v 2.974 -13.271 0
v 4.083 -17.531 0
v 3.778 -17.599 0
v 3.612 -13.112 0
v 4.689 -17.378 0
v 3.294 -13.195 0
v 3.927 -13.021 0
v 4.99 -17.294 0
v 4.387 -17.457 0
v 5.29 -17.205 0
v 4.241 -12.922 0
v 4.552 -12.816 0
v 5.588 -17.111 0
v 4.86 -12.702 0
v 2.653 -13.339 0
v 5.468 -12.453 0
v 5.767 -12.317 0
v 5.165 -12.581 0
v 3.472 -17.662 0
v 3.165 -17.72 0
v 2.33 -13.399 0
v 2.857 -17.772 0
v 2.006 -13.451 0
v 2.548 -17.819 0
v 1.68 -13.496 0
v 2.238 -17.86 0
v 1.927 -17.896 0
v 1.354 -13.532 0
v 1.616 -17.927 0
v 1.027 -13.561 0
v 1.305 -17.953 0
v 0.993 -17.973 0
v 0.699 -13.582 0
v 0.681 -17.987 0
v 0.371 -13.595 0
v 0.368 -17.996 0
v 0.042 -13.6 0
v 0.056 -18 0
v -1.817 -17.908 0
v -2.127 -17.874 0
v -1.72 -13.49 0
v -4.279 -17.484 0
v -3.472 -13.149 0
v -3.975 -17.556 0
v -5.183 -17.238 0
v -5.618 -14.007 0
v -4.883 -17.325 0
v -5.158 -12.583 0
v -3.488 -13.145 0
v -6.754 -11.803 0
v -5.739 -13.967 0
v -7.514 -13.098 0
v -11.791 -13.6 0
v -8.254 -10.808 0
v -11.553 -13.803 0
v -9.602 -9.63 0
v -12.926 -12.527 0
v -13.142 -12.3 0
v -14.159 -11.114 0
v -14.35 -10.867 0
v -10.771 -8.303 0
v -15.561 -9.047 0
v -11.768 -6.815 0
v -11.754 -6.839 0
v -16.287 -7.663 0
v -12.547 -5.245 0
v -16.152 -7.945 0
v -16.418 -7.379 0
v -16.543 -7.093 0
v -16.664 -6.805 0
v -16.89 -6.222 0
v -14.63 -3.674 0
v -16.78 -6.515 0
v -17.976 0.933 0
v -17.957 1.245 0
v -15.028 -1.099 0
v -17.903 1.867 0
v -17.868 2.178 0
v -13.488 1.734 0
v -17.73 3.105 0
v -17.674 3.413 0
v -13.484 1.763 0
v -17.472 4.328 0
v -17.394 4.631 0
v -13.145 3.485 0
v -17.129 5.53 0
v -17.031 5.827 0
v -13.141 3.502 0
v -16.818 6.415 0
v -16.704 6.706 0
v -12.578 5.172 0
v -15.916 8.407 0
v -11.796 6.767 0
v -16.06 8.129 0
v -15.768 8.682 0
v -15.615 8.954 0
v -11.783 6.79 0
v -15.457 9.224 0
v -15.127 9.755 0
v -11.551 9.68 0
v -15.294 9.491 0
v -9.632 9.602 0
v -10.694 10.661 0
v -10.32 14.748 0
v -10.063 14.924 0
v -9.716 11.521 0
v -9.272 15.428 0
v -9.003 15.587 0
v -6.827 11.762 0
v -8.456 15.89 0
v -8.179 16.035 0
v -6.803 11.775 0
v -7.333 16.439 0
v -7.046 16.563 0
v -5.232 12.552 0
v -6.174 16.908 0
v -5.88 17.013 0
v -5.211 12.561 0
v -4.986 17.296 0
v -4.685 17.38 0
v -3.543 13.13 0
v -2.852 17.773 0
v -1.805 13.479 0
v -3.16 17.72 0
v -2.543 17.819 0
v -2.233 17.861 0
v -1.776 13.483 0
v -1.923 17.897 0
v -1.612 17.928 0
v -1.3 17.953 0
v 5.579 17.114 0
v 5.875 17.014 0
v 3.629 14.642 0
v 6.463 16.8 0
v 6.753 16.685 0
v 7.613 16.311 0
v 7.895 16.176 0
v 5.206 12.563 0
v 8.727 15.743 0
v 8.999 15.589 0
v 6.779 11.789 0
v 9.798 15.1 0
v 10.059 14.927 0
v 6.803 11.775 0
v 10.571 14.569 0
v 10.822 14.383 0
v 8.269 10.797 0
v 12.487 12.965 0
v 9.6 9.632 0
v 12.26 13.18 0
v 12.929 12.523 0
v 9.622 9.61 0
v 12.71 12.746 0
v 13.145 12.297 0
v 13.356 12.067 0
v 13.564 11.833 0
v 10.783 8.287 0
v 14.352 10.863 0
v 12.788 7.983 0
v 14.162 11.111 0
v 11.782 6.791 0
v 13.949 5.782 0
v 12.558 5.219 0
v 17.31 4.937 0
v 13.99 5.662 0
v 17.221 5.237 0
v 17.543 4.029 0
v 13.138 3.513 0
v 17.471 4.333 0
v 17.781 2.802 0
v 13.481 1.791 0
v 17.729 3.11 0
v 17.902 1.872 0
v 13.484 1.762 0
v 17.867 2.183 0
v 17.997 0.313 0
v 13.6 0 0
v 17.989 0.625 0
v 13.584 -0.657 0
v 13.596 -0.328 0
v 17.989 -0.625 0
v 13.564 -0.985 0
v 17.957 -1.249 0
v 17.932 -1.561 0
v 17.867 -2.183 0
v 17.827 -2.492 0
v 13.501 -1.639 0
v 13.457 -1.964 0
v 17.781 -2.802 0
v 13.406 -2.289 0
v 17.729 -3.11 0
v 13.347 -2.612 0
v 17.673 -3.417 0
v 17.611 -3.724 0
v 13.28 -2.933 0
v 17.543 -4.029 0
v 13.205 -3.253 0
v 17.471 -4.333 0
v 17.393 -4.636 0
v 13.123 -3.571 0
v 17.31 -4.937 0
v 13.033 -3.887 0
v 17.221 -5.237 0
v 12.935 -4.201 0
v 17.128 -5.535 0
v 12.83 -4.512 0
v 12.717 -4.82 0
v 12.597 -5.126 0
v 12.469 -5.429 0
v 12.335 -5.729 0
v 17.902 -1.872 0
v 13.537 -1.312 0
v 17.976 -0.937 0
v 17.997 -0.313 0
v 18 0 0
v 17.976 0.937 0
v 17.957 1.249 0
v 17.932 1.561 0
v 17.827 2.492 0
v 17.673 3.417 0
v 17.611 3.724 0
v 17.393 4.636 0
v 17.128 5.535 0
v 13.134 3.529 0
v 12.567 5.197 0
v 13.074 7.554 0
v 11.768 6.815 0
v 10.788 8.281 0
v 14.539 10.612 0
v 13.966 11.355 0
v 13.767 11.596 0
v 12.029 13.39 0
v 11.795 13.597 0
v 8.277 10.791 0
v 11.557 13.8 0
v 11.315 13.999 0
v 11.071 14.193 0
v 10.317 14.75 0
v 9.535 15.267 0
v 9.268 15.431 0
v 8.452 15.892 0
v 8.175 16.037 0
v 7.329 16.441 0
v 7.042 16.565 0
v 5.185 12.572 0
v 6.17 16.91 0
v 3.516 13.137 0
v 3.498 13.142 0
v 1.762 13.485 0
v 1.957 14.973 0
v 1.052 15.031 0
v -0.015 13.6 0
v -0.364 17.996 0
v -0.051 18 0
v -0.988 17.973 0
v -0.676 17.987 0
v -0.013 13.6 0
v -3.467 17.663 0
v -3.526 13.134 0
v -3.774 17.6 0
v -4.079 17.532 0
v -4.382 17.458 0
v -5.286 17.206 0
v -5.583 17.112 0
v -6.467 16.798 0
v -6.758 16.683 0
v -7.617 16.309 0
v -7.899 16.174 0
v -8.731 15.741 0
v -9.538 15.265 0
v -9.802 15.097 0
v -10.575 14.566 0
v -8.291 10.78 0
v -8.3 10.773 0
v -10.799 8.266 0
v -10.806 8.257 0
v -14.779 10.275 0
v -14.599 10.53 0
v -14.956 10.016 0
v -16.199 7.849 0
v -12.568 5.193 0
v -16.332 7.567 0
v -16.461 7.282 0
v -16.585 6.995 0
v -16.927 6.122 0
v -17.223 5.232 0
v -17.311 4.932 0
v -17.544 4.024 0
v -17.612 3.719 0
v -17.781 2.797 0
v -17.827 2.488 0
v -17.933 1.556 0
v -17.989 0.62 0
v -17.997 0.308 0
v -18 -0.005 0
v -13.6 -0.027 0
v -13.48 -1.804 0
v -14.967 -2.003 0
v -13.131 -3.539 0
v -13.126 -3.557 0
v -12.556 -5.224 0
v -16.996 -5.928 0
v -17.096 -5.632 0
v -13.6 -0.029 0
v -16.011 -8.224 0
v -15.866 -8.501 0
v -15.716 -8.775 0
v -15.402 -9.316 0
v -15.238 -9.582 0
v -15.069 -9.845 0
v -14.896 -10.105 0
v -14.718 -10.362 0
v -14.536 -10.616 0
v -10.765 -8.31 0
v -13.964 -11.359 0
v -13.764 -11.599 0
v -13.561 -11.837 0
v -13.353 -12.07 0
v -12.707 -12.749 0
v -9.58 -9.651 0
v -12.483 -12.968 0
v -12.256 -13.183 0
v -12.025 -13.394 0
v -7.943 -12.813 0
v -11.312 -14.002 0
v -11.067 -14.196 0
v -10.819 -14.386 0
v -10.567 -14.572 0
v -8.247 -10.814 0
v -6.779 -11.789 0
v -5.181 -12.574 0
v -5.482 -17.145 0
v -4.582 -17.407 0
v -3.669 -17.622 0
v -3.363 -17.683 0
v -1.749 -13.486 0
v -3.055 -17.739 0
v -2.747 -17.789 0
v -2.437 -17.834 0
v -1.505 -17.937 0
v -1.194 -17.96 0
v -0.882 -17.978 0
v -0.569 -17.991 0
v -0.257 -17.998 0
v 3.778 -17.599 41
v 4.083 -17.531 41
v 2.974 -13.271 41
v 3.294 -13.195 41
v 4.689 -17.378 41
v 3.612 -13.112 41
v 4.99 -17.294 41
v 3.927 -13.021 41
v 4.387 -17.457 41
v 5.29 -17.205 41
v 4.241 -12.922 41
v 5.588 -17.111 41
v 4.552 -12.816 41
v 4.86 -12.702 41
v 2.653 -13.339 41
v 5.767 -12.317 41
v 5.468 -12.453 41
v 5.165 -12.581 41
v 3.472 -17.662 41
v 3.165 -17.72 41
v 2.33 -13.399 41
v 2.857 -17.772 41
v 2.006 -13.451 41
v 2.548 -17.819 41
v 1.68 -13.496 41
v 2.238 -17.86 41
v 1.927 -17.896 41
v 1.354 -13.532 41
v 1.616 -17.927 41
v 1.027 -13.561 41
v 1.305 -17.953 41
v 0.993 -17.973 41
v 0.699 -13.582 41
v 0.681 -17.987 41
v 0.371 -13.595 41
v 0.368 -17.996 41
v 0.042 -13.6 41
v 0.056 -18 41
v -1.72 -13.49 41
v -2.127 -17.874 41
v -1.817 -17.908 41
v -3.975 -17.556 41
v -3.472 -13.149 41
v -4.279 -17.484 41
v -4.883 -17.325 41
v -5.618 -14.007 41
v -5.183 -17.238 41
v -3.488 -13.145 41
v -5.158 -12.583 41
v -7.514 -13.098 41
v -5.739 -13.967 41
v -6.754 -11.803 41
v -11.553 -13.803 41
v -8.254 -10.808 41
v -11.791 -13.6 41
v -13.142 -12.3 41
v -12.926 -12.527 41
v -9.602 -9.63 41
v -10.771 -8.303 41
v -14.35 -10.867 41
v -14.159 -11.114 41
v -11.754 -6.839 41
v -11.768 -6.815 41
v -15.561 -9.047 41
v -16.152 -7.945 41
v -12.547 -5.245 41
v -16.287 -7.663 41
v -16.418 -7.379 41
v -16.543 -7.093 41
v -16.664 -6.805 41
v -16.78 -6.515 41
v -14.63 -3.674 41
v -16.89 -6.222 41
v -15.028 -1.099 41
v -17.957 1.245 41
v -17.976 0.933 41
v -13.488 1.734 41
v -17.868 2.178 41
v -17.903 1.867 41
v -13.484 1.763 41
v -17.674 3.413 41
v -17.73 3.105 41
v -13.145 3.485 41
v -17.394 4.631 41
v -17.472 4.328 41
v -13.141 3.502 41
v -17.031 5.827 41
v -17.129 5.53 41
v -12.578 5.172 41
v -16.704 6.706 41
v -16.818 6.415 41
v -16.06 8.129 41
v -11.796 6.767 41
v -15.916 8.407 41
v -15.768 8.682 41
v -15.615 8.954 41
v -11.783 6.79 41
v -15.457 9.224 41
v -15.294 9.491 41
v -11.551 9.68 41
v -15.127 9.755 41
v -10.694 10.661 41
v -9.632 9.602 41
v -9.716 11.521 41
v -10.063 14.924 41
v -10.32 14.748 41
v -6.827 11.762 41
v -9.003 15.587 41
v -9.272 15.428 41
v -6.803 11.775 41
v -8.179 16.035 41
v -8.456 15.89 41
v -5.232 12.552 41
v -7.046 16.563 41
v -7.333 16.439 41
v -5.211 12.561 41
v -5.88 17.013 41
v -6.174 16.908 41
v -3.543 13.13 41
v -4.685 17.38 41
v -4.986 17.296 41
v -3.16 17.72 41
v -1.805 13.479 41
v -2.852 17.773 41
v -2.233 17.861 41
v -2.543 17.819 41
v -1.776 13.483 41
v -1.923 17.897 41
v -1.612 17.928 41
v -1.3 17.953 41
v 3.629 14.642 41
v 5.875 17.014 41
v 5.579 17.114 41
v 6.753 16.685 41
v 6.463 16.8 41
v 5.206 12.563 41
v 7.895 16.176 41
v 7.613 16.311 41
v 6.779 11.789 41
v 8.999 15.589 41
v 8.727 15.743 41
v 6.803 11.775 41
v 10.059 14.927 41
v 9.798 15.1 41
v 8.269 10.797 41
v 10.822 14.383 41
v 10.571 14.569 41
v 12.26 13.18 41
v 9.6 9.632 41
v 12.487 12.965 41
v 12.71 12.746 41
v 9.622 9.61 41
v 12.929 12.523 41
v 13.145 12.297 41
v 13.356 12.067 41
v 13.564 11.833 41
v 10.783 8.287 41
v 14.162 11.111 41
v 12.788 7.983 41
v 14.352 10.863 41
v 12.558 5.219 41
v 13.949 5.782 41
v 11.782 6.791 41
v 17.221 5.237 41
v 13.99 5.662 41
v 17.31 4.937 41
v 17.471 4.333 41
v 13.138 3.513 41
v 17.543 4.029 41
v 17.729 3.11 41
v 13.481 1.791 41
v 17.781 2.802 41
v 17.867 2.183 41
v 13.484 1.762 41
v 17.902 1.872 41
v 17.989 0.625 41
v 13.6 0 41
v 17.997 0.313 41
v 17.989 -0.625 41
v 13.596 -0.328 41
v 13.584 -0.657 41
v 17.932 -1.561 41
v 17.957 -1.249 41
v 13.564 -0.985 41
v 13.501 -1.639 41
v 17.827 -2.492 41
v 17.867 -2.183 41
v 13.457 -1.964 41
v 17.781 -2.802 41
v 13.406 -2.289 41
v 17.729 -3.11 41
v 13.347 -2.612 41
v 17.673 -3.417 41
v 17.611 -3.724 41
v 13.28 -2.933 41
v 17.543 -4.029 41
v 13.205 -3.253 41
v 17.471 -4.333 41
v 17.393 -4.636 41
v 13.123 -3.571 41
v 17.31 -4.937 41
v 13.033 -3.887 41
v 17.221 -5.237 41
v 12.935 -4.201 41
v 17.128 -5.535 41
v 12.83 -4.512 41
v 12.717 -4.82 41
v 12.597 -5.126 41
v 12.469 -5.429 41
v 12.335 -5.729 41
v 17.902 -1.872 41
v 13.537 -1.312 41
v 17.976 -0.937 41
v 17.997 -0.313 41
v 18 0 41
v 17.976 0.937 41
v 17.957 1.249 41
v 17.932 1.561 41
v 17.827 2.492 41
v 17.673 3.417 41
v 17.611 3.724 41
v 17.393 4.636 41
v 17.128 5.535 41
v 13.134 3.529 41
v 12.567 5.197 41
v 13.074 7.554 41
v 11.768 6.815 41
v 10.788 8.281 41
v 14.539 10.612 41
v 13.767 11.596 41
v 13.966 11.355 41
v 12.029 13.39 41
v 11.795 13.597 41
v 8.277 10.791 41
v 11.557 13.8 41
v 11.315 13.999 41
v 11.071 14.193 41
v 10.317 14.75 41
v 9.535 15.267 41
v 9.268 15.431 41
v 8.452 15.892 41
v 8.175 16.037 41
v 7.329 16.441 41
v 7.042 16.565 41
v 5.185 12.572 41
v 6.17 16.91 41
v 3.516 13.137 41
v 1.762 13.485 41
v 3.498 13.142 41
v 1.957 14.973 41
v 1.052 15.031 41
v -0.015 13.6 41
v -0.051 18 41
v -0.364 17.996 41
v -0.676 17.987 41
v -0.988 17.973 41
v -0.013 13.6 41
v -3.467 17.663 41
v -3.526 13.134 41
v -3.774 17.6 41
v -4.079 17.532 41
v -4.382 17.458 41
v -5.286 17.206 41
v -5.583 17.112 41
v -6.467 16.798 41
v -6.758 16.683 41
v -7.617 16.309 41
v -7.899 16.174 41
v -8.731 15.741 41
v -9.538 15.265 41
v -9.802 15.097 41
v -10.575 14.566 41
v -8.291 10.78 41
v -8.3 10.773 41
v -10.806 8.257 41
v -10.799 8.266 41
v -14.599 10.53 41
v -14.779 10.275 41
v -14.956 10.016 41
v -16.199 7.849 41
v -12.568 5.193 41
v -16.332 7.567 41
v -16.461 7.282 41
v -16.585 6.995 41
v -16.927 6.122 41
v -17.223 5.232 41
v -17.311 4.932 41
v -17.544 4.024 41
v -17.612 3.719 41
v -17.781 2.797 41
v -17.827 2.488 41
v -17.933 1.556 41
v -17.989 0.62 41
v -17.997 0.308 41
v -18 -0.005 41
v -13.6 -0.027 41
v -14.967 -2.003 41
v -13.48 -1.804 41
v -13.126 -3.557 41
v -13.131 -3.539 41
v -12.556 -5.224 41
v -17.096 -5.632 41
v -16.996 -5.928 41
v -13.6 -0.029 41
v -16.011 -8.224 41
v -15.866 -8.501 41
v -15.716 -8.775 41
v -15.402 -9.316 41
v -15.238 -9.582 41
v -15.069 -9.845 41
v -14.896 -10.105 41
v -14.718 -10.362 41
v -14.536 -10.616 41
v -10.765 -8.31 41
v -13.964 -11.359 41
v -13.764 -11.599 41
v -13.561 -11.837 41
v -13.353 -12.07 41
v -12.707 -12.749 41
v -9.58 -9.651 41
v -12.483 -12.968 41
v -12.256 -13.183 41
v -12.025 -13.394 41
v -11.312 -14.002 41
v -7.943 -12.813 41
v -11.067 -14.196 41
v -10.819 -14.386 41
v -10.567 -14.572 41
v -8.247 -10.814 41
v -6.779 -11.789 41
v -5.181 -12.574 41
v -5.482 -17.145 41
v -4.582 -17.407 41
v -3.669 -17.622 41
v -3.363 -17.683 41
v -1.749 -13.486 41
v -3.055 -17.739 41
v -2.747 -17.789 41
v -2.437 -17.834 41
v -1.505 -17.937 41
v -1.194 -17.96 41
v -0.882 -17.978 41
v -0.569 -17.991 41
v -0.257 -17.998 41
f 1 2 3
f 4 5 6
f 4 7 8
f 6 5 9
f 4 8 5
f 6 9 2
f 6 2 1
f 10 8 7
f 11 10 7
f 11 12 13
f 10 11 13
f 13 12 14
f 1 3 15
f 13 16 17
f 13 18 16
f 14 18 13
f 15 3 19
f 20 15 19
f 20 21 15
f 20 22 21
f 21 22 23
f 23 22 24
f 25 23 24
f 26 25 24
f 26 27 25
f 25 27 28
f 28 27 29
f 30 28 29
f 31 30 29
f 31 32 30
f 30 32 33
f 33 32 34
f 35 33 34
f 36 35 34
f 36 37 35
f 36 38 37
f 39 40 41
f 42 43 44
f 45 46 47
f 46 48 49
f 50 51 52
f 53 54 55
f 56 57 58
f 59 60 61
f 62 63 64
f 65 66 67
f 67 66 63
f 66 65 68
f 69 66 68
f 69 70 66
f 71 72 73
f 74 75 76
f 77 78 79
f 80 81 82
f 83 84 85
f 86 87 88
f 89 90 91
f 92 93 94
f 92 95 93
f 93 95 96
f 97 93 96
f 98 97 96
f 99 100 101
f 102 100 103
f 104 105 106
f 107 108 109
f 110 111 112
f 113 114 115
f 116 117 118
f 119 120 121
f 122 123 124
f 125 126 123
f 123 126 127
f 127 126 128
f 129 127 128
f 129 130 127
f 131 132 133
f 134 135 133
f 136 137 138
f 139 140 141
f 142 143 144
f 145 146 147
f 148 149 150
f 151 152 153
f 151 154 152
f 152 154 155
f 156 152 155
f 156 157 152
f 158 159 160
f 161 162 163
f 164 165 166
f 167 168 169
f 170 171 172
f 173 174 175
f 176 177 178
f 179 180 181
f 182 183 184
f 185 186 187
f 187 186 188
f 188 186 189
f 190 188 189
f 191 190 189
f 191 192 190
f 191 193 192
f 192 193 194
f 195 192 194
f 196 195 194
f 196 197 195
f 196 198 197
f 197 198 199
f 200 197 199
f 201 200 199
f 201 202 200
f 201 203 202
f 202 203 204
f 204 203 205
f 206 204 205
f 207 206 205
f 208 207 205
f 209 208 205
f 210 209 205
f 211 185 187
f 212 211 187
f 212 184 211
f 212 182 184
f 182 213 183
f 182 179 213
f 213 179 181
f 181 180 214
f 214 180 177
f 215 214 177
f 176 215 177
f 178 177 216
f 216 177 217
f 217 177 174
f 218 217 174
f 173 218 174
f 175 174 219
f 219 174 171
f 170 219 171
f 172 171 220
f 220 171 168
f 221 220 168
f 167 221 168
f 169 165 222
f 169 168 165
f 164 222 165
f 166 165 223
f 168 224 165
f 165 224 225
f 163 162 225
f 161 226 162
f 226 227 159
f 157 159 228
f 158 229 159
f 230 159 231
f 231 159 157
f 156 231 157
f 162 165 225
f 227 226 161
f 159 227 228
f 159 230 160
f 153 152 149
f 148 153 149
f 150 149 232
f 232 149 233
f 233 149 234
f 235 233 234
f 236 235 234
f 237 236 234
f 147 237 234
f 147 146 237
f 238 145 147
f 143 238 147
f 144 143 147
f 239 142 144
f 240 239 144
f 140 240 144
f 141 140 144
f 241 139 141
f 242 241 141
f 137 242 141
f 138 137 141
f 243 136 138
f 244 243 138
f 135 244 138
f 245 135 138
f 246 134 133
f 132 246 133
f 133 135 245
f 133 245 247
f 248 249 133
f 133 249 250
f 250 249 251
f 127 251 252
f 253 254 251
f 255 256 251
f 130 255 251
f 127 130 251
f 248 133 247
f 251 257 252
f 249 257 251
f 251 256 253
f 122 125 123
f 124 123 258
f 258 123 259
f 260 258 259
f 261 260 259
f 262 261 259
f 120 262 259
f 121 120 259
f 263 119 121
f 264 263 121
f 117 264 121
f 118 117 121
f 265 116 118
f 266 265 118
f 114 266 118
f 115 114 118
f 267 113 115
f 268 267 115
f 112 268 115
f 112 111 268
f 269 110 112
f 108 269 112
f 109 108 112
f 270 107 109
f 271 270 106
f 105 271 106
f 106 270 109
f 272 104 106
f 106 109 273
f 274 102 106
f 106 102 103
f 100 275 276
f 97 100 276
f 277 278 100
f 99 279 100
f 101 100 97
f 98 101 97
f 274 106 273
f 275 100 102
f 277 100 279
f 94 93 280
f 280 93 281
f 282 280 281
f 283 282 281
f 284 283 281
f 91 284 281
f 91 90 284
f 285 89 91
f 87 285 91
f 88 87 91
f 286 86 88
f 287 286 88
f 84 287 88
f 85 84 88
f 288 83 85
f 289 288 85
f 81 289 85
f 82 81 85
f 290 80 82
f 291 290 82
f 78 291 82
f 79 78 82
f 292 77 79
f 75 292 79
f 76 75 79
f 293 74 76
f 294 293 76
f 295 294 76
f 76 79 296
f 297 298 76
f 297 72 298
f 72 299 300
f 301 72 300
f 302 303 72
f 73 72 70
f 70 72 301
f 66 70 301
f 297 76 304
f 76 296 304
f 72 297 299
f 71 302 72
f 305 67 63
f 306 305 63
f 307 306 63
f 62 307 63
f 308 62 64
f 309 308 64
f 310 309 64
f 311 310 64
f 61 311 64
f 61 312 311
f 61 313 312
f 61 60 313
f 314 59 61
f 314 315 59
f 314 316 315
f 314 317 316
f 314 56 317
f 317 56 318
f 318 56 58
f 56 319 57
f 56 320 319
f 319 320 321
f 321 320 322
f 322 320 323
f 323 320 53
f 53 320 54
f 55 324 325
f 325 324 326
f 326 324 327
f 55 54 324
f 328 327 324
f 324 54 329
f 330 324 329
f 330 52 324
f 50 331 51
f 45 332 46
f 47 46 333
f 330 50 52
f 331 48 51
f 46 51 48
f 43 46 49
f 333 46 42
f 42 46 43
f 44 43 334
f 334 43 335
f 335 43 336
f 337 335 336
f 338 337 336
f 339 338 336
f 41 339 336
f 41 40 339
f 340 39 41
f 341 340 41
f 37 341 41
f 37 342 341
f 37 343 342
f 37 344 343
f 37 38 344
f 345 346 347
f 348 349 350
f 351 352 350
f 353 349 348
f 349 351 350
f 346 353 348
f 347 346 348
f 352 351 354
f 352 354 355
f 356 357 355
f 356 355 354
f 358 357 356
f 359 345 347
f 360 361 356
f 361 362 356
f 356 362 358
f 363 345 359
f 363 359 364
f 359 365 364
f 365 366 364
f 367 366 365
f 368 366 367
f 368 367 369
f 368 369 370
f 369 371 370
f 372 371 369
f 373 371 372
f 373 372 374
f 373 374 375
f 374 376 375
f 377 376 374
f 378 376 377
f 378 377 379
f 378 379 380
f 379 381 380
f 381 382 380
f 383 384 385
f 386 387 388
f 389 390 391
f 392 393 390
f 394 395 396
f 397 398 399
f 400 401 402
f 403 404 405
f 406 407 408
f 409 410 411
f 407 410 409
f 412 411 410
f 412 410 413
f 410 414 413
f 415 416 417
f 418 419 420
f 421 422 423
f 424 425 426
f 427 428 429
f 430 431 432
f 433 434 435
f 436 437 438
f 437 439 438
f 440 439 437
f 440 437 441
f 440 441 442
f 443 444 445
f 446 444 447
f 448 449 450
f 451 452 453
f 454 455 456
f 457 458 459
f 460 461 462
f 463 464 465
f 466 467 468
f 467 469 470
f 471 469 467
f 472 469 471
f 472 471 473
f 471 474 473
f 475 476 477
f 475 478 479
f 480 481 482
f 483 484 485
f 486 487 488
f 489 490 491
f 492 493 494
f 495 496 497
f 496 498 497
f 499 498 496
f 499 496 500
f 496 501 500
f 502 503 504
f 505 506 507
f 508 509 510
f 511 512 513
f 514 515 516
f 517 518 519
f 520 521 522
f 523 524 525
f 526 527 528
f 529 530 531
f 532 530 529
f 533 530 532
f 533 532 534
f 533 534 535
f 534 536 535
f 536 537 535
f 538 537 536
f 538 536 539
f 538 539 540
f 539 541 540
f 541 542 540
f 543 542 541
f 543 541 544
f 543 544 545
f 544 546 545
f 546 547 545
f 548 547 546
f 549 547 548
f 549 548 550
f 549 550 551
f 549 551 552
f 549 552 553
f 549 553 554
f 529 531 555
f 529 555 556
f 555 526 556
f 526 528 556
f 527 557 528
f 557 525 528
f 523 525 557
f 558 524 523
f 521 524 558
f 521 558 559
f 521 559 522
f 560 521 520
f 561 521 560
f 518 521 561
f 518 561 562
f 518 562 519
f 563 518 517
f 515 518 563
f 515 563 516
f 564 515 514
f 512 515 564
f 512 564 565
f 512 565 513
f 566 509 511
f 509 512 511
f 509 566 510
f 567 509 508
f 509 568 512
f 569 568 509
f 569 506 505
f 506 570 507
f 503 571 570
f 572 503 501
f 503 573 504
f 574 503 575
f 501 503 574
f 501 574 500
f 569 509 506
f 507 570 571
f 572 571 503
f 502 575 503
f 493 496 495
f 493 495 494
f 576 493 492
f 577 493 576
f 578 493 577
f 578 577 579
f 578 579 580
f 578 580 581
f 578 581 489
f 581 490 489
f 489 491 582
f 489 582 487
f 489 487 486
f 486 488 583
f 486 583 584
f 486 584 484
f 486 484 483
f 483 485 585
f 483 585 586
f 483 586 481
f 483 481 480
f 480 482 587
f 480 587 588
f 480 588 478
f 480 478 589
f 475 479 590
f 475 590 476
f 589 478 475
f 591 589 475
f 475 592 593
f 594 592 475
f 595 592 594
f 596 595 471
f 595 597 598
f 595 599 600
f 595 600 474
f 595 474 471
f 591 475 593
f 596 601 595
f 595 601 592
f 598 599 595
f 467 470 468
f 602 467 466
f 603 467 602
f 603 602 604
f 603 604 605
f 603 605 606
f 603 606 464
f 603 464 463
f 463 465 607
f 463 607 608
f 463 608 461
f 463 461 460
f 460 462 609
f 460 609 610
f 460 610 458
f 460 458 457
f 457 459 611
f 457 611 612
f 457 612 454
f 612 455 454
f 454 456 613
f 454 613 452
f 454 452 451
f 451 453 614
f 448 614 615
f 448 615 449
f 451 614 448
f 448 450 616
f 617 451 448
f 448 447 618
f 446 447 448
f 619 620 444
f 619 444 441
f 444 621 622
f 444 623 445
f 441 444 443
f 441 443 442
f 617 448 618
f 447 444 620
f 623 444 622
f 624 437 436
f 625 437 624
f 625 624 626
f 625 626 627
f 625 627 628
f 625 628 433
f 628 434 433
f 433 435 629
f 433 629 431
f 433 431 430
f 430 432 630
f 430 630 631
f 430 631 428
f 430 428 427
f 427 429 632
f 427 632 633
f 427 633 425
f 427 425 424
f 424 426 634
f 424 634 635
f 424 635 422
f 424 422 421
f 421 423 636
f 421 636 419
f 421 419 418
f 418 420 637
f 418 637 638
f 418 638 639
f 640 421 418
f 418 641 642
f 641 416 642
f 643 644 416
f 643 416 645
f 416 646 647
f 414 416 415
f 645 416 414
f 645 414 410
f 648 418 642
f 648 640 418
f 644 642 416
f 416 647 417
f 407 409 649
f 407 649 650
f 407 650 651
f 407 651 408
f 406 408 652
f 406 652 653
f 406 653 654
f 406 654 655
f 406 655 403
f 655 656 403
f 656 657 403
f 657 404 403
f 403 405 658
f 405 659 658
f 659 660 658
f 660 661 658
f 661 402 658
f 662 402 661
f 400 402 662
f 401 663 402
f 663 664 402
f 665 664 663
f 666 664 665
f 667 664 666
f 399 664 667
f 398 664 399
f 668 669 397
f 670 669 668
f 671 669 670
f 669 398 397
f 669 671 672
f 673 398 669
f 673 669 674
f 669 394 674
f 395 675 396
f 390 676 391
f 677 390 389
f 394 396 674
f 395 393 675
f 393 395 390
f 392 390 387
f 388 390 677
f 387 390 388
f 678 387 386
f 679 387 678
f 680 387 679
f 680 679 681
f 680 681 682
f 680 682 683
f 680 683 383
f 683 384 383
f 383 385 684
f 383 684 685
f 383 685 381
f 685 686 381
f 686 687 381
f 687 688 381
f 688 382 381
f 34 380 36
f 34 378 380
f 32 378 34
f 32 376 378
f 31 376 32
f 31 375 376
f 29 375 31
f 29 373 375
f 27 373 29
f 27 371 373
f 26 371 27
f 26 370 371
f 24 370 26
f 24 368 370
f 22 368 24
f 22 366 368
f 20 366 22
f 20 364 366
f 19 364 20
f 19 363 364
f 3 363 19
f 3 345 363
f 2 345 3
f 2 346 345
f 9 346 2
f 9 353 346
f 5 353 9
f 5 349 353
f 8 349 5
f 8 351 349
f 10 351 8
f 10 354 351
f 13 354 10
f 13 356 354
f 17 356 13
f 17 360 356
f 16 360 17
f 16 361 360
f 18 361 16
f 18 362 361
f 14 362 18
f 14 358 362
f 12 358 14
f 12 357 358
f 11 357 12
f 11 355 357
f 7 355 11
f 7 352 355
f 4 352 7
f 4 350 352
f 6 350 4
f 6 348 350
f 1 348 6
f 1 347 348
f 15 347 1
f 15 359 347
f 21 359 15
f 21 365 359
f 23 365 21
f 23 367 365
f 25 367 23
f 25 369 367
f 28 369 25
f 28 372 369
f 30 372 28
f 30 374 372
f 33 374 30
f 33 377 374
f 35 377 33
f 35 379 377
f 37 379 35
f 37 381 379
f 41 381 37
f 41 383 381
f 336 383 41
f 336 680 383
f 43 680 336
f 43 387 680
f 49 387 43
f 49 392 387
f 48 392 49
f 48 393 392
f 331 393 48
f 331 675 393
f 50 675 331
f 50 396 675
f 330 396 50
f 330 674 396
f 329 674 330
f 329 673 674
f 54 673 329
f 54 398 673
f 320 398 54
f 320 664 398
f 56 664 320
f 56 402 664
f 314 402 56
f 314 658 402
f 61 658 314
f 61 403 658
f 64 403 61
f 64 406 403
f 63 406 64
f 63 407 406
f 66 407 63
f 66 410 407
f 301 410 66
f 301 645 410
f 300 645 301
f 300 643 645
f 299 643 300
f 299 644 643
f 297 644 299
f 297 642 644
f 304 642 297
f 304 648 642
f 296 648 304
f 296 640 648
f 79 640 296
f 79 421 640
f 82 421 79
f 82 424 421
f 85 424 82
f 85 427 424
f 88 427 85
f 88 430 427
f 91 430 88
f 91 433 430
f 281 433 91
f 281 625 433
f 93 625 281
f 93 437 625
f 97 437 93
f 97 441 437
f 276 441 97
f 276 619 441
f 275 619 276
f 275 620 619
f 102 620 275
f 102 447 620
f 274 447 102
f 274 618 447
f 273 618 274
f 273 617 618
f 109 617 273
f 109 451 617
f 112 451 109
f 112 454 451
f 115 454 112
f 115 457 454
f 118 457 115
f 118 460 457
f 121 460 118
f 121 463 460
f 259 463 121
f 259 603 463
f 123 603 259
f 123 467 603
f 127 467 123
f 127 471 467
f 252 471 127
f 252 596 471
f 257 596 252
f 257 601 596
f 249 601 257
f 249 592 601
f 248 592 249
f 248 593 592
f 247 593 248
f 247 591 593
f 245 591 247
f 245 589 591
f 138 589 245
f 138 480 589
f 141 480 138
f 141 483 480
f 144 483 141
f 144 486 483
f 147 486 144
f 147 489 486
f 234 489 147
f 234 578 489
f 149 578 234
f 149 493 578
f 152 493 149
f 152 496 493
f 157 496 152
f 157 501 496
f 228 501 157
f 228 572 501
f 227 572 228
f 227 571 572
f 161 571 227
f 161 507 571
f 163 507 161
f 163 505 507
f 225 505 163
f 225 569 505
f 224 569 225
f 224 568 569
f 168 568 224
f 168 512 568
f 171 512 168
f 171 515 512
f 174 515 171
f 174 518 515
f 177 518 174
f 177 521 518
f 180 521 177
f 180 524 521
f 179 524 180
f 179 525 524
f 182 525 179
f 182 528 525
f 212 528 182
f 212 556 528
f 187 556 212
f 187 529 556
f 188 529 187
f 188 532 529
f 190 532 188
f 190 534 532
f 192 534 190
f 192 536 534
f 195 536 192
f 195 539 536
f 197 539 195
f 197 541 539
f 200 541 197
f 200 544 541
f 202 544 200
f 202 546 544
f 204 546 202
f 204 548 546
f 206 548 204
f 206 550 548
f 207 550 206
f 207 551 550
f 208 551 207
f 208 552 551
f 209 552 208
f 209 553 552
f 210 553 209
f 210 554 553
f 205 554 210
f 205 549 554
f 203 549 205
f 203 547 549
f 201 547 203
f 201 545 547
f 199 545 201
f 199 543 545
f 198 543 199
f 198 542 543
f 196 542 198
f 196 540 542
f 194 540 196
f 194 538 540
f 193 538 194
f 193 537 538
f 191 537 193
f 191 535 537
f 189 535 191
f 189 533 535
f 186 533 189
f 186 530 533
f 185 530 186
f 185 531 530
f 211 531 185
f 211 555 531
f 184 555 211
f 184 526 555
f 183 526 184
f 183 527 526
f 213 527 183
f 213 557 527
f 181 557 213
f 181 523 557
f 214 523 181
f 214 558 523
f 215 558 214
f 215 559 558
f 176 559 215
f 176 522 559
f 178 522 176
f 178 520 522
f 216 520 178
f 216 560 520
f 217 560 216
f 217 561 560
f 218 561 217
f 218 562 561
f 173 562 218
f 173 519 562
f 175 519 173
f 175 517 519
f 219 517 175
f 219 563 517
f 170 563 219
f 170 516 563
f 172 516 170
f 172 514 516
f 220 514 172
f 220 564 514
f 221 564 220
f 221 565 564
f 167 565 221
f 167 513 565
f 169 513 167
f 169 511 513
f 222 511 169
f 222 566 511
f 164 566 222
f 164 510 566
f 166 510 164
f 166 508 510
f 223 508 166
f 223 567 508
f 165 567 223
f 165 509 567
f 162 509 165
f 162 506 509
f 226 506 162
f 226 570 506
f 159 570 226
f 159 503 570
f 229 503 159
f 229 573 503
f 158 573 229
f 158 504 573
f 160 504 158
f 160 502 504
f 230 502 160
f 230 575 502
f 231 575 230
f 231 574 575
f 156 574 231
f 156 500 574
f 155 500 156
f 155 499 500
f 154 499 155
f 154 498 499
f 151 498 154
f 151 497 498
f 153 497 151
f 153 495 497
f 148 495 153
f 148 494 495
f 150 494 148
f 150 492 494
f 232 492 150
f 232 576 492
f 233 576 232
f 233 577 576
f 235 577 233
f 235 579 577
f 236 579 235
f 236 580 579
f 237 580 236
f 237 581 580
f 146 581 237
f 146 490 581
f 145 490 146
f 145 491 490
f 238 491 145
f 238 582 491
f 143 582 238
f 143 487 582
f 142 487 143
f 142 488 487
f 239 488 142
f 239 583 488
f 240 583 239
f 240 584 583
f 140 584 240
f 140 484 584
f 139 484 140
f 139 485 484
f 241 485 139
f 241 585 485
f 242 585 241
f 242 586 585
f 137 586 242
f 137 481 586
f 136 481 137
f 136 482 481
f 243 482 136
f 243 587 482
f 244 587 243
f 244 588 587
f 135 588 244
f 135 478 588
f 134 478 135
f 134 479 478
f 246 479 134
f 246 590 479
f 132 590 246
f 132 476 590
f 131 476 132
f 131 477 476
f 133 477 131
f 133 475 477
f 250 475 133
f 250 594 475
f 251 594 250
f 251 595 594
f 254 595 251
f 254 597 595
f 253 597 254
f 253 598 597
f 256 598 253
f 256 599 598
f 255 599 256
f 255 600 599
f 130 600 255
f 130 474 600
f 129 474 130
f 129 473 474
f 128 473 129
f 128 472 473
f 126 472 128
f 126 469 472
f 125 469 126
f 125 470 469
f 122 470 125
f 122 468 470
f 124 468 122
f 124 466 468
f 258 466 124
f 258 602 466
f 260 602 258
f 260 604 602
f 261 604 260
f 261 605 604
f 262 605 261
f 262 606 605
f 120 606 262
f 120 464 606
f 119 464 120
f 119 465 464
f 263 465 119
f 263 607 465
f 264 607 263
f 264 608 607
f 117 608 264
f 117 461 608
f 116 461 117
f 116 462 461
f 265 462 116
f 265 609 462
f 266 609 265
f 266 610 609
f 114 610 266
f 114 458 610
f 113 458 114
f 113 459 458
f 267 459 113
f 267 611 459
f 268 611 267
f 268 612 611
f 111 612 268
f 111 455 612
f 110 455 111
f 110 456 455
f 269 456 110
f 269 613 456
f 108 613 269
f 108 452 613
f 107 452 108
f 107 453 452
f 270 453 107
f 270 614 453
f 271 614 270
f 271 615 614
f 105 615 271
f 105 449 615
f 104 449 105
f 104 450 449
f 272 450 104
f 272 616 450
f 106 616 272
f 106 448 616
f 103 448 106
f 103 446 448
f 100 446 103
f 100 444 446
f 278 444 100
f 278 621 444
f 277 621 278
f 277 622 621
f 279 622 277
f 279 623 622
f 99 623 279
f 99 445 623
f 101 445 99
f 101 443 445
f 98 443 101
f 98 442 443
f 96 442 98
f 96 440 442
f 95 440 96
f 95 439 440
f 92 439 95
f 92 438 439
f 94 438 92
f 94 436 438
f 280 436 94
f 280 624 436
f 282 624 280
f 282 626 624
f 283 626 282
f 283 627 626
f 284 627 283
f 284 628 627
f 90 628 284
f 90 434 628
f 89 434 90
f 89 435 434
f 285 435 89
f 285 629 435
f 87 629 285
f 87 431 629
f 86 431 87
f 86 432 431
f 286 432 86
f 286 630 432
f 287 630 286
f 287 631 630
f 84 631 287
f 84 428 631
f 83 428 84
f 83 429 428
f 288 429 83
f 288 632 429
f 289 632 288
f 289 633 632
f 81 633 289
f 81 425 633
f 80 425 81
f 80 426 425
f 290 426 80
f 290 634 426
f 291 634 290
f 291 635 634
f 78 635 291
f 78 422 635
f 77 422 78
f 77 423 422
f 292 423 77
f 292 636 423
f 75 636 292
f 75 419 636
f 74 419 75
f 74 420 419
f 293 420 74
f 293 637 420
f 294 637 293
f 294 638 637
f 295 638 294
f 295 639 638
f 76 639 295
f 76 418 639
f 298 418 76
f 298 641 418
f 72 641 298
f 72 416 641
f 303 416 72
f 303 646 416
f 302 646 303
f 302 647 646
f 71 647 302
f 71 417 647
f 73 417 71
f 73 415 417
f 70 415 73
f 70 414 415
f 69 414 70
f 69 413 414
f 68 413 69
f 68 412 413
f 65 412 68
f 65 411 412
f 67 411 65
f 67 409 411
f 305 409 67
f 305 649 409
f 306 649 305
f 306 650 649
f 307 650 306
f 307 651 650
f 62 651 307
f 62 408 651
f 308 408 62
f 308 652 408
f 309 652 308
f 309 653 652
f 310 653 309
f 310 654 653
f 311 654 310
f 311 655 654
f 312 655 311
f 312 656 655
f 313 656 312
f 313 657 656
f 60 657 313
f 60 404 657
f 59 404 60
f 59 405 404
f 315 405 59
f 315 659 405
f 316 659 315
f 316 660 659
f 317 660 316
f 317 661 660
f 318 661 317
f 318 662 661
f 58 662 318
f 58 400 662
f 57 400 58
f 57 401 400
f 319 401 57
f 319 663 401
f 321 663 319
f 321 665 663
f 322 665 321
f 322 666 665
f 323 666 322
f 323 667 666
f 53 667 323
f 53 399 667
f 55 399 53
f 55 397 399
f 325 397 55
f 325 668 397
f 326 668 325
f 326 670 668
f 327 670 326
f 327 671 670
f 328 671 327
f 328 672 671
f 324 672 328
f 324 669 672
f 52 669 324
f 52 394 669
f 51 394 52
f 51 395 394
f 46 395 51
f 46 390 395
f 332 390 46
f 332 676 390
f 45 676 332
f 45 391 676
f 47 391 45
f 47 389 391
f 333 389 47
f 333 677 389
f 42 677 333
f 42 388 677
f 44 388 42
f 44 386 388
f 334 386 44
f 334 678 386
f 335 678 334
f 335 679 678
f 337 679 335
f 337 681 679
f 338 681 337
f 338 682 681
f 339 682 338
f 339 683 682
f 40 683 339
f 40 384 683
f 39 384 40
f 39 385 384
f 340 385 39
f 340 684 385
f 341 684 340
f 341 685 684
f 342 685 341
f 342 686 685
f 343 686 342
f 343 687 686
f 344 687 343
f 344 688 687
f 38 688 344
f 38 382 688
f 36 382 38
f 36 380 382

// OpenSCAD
//<params>
outerDiameter = 36;
innerDiameter = 27.2;
jointThickness = 1.5;
jointLength = 1;
numberOfPieces = 6;
openingAngle = 40;
height = 41;

//</params>

module dummy(){}

circlePerimeter = PI* innerDiameter; 
perimeter = (360-openingAngle) * circlePerimeter / 360;
piecePerimeter = (perimeter+jointLength)/numberOfPieces - jointLength;
pieceAngle = piecePerimeter / circlePerimeter * 360;
pieceSliceAngle = (outerDiameter-innerDiameter)/2/(PI*outerDiameter)*360/2;

$fn = 36;

function arc(r=10,startAngle=0,endAngle=180)
    = [for (i=[0:$fn]) let(a=startAngle+(endAngle-startAngle)*i/$fn) r*[cos(a),sin(a)]];

module piece() {
    z = concat(
        arc(r=innerDiameter/2,
            startAngle=-pieceAngle/2,
            endAngle=pieceAngle/2),
         arc(r=outerDiameter/2,
            startAngle=pieceAngle/2-pieceSliceAngle,endAngle=-pieceAngle/2+pieceSliceAngle));
    polygon(z);
}

module profile() {
    extPieceAngle = pieceAngle+jointLength/circlePerimeter*360;
    for (i=[0:numberOfPieces-1])
        rotate(extPieceAngle*i) piece();
    
    t0 = 0;
    t1 = -pieceAngle+numberOfPieces*extPieceAngle-jointLength/circlePerimeter*360;
    polygon(concat(arc(r=innerDiameter/2,
        startAngle=t0,
        endAngle=t1),arc(r=innerDiameter/2+jointThickness,
        startAngle=t1,
        endAngle=t0)));
}

linear_extrude(height=height) profile();
